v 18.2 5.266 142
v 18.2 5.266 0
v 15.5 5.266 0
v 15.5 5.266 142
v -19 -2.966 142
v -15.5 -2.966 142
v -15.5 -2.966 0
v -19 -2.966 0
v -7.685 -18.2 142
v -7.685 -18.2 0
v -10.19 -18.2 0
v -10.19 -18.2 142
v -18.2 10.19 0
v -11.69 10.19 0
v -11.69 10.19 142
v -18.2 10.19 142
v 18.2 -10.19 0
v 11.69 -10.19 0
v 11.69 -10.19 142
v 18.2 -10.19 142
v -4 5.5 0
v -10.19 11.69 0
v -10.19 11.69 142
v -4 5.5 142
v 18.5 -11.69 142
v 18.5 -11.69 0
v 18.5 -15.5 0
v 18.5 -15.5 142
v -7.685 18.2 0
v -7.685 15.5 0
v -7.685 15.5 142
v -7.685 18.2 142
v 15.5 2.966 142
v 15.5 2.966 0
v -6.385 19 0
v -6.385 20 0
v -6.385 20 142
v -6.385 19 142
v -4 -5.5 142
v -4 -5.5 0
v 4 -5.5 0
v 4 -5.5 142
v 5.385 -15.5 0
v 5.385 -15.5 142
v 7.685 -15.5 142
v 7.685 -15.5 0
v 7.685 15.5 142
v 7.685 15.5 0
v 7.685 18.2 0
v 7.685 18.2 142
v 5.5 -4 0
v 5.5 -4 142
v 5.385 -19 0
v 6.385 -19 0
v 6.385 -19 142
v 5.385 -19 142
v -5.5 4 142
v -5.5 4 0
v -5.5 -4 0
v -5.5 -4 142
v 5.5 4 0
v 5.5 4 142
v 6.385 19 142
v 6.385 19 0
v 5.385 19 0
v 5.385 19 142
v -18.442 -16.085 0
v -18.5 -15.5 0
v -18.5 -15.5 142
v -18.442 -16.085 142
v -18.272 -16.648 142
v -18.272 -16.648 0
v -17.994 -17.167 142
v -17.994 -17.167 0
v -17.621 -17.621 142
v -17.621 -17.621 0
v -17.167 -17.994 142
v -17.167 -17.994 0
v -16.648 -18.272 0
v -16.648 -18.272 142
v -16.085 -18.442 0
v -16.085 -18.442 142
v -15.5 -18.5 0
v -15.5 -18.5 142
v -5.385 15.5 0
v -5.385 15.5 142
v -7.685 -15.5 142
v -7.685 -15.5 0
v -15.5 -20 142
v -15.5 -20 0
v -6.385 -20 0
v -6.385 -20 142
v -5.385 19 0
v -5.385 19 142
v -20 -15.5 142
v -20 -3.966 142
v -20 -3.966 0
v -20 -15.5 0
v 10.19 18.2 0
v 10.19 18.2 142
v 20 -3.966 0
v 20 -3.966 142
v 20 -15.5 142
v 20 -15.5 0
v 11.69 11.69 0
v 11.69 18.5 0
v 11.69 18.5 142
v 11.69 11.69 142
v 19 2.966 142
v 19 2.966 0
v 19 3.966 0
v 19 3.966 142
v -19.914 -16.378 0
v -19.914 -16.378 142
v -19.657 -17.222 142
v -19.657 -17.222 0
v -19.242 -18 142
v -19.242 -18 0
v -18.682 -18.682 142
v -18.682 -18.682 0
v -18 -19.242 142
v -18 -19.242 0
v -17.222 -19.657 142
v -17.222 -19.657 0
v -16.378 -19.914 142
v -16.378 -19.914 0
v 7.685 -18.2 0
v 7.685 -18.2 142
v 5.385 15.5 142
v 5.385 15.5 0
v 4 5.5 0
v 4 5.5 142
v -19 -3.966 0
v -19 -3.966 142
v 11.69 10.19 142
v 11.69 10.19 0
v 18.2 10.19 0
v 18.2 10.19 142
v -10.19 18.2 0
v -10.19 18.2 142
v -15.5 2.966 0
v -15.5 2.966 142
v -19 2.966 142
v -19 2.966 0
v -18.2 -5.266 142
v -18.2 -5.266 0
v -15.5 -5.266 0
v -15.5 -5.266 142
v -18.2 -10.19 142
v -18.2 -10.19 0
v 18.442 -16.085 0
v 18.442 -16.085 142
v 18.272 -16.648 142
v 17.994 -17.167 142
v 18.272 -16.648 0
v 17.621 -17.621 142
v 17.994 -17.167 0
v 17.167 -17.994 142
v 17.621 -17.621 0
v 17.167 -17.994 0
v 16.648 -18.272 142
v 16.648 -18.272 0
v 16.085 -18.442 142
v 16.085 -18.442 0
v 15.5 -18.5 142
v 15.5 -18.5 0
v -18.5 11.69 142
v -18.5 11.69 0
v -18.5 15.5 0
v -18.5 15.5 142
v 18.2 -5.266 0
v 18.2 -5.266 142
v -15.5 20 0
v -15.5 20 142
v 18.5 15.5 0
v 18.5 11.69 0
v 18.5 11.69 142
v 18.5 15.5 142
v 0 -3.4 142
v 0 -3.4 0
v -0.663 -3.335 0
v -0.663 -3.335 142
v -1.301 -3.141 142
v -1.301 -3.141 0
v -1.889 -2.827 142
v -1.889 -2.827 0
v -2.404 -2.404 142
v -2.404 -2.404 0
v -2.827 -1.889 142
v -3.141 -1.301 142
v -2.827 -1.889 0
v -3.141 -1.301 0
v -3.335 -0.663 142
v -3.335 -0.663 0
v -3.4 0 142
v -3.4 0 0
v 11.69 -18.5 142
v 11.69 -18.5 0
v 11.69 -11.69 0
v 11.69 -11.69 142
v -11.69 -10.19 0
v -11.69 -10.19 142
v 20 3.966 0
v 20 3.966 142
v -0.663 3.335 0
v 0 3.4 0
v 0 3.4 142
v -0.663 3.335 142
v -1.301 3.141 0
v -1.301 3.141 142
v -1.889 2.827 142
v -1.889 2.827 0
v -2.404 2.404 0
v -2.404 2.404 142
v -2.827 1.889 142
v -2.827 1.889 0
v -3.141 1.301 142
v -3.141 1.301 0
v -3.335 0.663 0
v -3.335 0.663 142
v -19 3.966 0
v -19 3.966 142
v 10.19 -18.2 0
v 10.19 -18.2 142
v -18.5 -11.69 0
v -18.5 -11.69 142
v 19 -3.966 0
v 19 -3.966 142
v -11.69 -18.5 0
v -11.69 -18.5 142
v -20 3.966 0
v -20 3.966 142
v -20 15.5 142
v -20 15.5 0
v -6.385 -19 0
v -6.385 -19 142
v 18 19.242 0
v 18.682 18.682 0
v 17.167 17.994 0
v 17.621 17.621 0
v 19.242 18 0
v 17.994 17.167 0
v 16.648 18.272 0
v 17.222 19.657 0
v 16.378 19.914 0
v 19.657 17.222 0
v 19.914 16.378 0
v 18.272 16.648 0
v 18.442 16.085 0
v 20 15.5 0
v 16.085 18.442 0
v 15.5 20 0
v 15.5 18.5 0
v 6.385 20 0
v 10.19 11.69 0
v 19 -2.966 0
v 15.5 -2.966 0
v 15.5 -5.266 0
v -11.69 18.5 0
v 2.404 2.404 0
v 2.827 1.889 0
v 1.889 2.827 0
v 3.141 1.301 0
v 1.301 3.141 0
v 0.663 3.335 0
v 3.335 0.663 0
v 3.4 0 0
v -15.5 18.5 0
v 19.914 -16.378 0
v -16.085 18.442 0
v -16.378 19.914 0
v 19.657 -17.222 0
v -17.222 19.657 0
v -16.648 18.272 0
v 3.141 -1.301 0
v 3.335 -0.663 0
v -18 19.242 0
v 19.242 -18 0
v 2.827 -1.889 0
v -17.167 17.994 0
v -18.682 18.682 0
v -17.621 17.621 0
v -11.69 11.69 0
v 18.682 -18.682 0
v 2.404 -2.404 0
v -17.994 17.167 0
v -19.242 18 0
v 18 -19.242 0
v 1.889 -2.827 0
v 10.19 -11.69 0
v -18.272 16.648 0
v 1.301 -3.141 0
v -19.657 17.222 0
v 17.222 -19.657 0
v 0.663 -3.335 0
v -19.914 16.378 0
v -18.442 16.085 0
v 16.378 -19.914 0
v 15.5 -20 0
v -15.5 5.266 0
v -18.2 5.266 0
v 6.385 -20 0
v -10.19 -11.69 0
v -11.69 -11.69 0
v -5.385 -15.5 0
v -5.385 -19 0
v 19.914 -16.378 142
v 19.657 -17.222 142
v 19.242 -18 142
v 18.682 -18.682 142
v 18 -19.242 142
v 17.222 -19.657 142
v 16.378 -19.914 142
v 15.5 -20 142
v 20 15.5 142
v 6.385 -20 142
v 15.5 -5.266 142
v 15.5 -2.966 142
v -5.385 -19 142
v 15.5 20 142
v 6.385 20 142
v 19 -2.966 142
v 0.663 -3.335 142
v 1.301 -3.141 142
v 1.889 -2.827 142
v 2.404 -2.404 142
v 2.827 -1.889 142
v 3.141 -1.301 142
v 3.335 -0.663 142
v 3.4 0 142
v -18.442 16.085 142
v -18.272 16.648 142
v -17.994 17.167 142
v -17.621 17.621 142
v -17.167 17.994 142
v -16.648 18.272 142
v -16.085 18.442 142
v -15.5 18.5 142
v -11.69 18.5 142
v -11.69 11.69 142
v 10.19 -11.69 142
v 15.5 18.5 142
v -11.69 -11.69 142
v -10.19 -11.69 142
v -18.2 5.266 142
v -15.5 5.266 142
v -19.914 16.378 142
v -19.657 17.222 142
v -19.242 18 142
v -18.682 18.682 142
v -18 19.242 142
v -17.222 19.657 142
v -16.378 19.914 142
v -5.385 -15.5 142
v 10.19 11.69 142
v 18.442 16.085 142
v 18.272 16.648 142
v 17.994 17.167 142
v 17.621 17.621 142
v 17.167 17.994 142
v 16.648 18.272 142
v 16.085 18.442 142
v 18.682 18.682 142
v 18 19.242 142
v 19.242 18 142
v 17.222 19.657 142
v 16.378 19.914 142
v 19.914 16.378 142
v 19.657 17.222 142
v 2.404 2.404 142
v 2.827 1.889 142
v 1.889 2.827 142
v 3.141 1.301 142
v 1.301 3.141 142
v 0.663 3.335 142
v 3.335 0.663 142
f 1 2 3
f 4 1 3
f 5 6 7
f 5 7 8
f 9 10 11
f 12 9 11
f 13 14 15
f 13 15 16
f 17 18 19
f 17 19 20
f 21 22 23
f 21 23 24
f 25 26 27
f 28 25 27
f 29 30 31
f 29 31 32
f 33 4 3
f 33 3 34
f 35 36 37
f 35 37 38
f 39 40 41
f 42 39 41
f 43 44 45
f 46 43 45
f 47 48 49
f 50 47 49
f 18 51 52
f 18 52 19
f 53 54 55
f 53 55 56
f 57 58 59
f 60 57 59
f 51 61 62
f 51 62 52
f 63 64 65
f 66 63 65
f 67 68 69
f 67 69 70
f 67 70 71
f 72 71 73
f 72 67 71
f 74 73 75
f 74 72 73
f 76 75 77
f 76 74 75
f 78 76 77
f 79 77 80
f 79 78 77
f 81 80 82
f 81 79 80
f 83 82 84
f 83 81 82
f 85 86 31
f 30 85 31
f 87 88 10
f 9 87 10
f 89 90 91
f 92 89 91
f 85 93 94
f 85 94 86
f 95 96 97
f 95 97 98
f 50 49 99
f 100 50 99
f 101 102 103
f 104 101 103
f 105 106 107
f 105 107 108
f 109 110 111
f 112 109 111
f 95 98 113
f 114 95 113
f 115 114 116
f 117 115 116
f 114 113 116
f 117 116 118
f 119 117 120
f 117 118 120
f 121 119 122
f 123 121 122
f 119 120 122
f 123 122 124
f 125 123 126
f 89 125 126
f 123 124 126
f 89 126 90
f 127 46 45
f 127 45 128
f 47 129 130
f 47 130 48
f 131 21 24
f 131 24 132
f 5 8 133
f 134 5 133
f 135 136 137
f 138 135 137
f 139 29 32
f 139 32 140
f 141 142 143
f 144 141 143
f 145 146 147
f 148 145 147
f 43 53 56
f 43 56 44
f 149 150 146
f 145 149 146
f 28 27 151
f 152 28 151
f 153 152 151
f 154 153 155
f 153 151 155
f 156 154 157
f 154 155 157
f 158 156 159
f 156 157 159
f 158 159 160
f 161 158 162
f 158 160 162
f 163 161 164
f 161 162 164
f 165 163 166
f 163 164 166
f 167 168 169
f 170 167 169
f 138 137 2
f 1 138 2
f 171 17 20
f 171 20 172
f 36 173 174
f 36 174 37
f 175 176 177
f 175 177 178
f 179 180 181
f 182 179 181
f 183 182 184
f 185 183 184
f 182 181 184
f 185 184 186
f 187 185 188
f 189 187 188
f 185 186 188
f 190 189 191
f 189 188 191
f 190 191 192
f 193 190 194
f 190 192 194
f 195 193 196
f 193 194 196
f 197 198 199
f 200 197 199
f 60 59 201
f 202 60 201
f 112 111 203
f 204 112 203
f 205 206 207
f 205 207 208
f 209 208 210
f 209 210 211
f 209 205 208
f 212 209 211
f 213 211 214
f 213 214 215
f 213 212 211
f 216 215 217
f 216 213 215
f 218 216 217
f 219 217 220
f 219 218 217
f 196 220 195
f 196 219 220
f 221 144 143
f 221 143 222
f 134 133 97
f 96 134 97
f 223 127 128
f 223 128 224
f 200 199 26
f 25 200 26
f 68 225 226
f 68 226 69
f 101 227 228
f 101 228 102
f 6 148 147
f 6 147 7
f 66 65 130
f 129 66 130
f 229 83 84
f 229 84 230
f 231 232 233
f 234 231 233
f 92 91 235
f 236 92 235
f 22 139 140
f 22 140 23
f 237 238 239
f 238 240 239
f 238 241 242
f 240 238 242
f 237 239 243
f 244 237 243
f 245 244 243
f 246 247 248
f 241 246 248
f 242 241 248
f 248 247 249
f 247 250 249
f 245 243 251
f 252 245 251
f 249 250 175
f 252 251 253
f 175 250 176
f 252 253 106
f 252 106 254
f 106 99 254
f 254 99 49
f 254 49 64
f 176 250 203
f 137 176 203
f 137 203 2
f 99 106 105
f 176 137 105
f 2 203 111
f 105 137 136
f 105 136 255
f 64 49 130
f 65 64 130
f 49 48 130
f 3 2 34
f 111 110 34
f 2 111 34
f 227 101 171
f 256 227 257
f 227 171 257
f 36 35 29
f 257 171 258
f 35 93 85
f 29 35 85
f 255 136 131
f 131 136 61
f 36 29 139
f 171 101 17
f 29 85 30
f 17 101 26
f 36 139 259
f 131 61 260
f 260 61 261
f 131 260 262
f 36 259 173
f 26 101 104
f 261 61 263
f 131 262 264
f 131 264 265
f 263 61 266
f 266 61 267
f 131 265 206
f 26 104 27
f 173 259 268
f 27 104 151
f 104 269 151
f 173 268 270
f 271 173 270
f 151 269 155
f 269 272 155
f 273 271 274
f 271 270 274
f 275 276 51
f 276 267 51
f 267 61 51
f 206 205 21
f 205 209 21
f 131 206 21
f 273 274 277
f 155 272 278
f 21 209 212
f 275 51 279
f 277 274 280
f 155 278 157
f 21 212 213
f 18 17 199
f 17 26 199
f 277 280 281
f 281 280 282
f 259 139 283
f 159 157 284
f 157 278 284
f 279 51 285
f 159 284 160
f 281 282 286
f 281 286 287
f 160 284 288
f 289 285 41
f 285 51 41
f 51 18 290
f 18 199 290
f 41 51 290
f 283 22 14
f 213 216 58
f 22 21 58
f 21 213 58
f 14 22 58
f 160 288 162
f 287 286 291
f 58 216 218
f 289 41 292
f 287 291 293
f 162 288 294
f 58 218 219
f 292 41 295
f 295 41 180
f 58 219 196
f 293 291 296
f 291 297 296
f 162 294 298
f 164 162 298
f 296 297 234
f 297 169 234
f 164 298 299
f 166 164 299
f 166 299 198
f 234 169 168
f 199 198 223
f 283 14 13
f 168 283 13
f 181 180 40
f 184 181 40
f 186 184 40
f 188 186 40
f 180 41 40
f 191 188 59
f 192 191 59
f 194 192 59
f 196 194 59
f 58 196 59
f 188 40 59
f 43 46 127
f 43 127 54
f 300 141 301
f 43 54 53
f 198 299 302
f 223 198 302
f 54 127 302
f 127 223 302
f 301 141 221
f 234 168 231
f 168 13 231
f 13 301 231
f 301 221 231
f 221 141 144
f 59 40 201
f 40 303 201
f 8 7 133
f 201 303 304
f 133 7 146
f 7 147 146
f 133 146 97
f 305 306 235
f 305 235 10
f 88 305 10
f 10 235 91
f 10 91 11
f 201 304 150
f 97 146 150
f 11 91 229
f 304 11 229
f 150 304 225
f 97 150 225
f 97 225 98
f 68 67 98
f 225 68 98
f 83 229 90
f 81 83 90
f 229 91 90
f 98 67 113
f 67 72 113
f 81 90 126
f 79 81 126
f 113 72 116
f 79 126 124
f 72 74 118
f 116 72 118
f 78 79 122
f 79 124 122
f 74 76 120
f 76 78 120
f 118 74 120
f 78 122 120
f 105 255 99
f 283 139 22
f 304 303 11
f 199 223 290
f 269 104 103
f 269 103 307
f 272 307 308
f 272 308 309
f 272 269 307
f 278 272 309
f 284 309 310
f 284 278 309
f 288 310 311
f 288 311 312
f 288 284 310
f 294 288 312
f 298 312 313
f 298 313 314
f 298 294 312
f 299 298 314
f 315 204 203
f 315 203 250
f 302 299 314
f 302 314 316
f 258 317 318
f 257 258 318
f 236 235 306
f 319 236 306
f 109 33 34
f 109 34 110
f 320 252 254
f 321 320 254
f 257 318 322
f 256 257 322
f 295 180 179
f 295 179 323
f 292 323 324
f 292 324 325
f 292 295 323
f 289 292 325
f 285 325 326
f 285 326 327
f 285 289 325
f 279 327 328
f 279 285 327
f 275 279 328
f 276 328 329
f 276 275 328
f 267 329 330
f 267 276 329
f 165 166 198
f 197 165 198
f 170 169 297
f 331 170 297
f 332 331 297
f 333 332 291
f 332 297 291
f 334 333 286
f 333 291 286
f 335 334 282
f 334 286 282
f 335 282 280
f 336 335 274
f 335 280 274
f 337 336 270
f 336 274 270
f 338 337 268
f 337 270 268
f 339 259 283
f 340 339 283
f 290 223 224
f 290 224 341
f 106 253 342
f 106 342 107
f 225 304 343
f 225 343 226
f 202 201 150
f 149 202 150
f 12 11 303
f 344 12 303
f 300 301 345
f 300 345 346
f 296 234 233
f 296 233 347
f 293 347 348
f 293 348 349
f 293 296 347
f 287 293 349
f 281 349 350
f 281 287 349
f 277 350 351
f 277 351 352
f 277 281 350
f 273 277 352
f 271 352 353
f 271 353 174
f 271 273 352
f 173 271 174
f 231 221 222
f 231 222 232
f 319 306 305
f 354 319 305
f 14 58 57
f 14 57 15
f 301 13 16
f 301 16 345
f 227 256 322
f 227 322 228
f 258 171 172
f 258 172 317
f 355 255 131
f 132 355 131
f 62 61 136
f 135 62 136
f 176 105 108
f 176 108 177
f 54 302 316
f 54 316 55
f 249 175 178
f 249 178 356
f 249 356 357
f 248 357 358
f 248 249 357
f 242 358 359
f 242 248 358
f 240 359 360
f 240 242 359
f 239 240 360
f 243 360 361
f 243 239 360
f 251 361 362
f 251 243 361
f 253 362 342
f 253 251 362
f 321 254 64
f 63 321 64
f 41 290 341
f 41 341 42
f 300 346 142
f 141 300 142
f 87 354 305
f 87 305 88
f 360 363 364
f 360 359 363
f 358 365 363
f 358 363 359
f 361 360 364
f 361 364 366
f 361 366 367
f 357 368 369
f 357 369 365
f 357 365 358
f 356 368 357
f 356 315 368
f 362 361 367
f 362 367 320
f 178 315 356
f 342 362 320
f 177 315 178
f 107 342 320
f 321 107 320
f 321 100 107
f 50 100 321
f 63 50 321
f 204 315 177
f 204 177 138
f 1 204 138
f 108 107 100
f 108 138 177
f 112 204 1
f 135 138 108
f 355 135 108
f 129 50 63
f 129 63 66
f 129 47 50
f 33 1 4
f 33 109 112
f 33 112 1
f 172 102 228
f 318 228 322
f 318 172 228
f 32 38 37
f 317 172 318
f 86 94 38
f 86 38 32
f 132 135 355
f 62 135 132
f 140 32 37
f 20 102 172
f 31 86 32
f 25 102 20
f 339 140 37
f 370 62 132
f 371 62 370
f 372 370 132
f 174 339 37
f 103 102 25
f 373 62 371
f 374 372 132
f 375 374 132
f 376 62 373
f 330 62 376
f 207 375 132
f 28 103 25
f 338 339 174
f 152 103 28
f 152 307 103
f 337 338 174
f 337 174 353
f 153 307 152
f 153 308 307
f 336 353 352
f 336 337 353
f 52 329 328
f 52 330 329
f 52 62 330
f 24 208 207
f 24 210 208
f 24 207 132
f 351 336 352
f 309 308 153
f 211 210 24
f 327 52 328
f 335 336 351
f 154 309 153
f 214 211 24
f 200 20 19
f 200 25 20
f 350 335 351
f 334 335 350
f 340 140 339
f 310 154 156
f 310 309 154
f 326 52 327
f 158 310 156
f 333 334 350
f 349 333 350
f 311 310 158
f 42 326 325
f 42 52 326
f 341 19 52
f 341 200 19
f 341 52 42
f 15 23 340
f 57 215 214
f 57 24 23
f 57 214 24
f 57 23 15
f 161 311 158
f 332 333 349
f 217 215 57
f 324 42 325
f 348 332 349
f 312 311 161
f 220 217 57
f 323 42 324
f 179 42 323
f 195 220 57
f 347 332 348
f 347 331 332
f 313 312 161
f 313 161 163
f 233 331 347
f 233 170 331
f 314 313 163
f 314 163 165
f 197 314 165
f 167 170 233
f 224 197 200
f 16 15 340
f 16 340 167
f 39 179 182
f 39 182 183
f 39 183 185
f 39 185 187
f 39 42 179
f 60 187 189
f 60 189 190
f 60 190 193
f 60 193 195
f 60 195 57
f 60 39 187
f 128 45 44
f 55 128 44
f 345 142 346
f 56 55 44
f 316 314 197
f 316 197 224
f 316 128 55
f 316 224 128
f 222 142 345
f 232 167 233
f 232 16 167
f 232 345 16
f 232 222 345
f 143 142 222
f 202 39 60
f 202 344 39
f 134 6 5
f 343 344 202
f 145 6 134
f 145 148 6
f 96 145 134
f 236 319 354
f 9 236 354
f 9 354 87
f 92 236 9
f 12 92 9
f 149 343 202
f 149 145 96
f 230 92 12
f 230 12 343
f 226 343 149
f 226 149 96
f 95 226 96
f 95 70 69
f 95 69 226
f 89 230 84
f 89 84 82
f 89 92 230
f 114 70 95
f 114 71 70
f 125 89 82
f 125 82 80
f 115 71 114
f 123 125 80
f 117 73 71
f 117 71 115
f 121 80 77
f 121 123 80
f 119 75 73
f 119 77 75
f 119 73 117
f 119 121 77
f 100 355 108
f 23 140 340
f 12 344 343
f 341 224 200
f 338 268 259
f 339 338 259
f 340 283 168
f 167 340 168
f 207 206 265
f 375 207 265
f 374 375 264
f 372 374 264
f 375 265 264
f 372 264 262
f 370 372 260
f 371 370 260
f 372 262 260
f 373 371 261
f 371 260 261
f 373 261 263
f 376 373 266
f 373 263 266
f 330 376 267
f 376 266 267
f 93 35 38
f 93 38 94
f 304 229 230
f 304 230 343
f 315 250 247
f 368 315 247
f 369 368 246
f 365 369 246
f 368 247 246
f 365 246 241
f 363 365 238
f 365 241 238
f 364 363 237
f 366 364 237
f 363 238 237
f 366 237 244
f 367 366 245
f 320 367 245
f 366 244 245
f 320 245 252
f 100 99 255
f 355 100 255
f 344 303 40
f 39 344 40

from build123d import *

# Parameters (mm, degrees)
BOSS_EXTRUDE1_DEPTH  = 142
MIRROR3_COPY_1_DEPTH = 142
MIRROR3_COPY_2_DEPTH = 142


with BuildPart() as part:
    # Sketch1 → Boss-Extrude1 (new body)
    with BuildSketch(Plane.XY):
        with BuildLine():
            Line((3.4, 0), (5.5, 0))
            Line((5.5, 0), (5.5, 4))
            Line((5.5, 4), (11.69, 10.19))
            Line((11.69, 10.19), (18.2, 10.19))
            Line((18.2, 10.19), (18.2, 5.265595036))
            Line((18.2, 5.265595036), (15.5, 5.265595036))
            Line((15.5, 5.265595036), (15.5, 2.965595036))
            Line((15.5, 2.965595036), (19, 2.965595036))
            Line((19, 2.965595036), (19, 3.965595036))
            Line((19, 3.965595036), (20, 3.965595036))
            Line((20, 3.965595036), (20, 15.5))
            ThreePointArc((20, 15.5), (18.681980515, 18.681980515), (15.5, 20))
            Line((15.5, 20), (6.385304712, 20))
            Line((6.385304712, 20), (6.385304712, 19))
            Line((6.385304712, 19), (5.385304712, 19))
            Line((5.385304712, 19), (5.385304712, 15.5))
            Line((5.385304712, 15.5), (7.685304712, 15.5))
            Line((7.685304712, 15.5), (7.685304712, 18.2))
            Line((7.685304712, 18.2), (10.19, 18.2))
            Line((10.19, 18.2), (10.19, 11.69))
            Line((10.19, 11.69), (4, 5.5))
            Line((4, 5.5), (0, 5.5))
            Line((0, 5.5), (0, 3.4))
            ThreePointArc((0, 3.4), (2.404163056, 2.404163056), (3.4, 0))
        make_face()
        with BuildLine():
            Line((18.5, 11.69), (18.5, 15.5))
            ThreePointArc((18.5, 15.5), (17.621320344, 17.621320344), (15.5, 18.5))
            Line((15.5, 18.5), (11.69, 18.5))
            Line((11.69, 18.5), (11.69, 11.69))
            Line((11.69, 11.69), (18.5, 11.69))
        make_face(mode=Mode.SUBTRACT)
    boss_extrude1 = extrude(amount=BOSS_EXTRUDE1_DEPTH)

    # Mirror1: Boss-Extrude1 across plane
    add(boss_extrude1.mirror(Plane.ZX))

    # Mirror2: Boss-Extrude1 across plane
    add(boss_extrude1.mirror(Plane(origin=(0, 0, 0), x_dir=(0, 0, 1), z_dir=(1, 0, 0))))

    # Mirror3 copy 1 sketch → Mirror3 copy 1 (add)
    with BuildSketch(Plane(origin=(0, 0, 0), x_dir=(-1, 0, 0), z_dir=(0, 0, 1))):
        with BuildLine():
            Line((3.4, 0), (5.5, 0))
            Line((5.5, 0), (5.5, 4))
            Line((5.5, 4), (11.69, 10.19))
            Line((11.69, 10.19), (18.2, 10.19))
            Line((18.2, 10.19), (18.2, 5.265595036))
            Line((18.2, 5.265595036), (15.5, 5.265595036))
            Line((15.5, 5.265595036), (15.5, 2.965595036))
            Line((15.5, 2.965595036), (19, 2.965595036))
            Line((19, 2.965595036), (19, 3.965595036))
            Line((19, 3.965595036), (20, 3.965595036))
            Line((20, 3.965595036), (20, 15.5))
            ThreePointArc((20, 15.5), (18.681980515, 18.681980515), (15.5, 20))
            Line((15.5, 20), (6.385304712, 20))
            Line((6.385304712, 20), (6.385304712, 19))
            Line((6.385304712, 19), (5.385304712, 19))
            Line((5.385304712, 19), (5.385304712, 15.5))
            Line((5.385304712, 15.5), (7.685304712, 15.5))
            Line((7.685304712, 15.5), (7.685304712, 18.2))
            Line((7.685304712, 18.2), (10.19, 18.2))
            Line((10.19, 18.2), (10.19, 11.69))
            Line((10.19, 11.69), (4, 5.5))
            Line((4, 5.5), (0, 5.5))
            Line((0, 5.5), (0, 3.4))
            ThreePointArc((0, 3.4), (2.404163056, 2.404163056), (3.4, 0))
        make_face()
        with BuildLine():
            Line((18.5, 11.69), (18.5, 15.5))
            ThreePointArc((18.5, 15.5), (17.621320344, 17.621320344), (15.5, 18.5))
            Line((15.5, 18.5), (11.69, 18.5))
            Line((11.69, 18.5), (11.69, 11.69))
            Line((11.69, 11.69), (18.5, 11.69))
        make_face(mode=Mode.SUBTRACT)
    extrude(amount=MIRROR3_COPY_1_DEPTH)

    # Mirror3 copy 2 sketch → Mirror3 copy 2 (add)
    with BuildSketch(Plane.XY):
        with BuildLine():
            Line((3.4, 0), (5.5, 0))
            Line((5.5, 0), (5.5, -4))
            Line((5.5, -4), (11.69, -10.19))
            Line((11.69, -10.19), (18.2, -10.19))
            Line((18.2, -10.19), (18.2, -5.265595036))
            Line((18.2, -5.265595036), (15.5, -5.265595036))
            Line((15.5, -5.265595036), (15.5, -2.965595036))
            Line((15.5, -2.965595036), (19, -2.965595036))
            Line((19, -2.965595036), (19, -3.965595036))
            Line((19, -3.965595036), (20, -3.965595036))
            Line((20, -3.965595036), (20, -15.5))
            ThreePointArc((20, -15.5), (18.681980515, -18.681980515), (15.5, -20))
            Line((15.5, -20), (6.385304712, -20))
            Line((6.385304712, -20), (6.385304712, -19))
            Line((6.385304712, -19), (5.385304712, -19))
            Line((5.385304712, -19), (5.385304712, -15.5))
            Line((5.385304712, -15.5), (7.685304712, -15.5))
            Line((7.685304712, -15.5), (7.685304712, -18.2))
            Line((7.685304712, -18.2), (10.19, -18.2))
            Line((10.19, -18.2), (10.19, -11.69))
            Line((10.19, -11.69), (4, -5.5))
            Line((4, -5.5), (0, -5.5))
            Line((0, -5.5), (0, -3.4))
            ThreePointArc((0, -3.4), (2.404163056, -2.404163056), (3.4, 0))
        make_face()
        with BuildLine():
            Line((18.5, -11.69), (18.5, -15.5))
            ThreePointArc((18.5, -15.5), (17.621320344, -17.621320344), (15.5, -18.5))
            Line((15.5, -18.5), (11.69, -18.5))
            Line((11.69, -18.5), (11.69, -11.69))
            Line((11.69, -11.69), (18.5, -11.69))
        make_face(mode=Mode.SUBTRACT)
    extrude(amount=MIRROR3_COPY_2_DEPTH)


solid = part.part
